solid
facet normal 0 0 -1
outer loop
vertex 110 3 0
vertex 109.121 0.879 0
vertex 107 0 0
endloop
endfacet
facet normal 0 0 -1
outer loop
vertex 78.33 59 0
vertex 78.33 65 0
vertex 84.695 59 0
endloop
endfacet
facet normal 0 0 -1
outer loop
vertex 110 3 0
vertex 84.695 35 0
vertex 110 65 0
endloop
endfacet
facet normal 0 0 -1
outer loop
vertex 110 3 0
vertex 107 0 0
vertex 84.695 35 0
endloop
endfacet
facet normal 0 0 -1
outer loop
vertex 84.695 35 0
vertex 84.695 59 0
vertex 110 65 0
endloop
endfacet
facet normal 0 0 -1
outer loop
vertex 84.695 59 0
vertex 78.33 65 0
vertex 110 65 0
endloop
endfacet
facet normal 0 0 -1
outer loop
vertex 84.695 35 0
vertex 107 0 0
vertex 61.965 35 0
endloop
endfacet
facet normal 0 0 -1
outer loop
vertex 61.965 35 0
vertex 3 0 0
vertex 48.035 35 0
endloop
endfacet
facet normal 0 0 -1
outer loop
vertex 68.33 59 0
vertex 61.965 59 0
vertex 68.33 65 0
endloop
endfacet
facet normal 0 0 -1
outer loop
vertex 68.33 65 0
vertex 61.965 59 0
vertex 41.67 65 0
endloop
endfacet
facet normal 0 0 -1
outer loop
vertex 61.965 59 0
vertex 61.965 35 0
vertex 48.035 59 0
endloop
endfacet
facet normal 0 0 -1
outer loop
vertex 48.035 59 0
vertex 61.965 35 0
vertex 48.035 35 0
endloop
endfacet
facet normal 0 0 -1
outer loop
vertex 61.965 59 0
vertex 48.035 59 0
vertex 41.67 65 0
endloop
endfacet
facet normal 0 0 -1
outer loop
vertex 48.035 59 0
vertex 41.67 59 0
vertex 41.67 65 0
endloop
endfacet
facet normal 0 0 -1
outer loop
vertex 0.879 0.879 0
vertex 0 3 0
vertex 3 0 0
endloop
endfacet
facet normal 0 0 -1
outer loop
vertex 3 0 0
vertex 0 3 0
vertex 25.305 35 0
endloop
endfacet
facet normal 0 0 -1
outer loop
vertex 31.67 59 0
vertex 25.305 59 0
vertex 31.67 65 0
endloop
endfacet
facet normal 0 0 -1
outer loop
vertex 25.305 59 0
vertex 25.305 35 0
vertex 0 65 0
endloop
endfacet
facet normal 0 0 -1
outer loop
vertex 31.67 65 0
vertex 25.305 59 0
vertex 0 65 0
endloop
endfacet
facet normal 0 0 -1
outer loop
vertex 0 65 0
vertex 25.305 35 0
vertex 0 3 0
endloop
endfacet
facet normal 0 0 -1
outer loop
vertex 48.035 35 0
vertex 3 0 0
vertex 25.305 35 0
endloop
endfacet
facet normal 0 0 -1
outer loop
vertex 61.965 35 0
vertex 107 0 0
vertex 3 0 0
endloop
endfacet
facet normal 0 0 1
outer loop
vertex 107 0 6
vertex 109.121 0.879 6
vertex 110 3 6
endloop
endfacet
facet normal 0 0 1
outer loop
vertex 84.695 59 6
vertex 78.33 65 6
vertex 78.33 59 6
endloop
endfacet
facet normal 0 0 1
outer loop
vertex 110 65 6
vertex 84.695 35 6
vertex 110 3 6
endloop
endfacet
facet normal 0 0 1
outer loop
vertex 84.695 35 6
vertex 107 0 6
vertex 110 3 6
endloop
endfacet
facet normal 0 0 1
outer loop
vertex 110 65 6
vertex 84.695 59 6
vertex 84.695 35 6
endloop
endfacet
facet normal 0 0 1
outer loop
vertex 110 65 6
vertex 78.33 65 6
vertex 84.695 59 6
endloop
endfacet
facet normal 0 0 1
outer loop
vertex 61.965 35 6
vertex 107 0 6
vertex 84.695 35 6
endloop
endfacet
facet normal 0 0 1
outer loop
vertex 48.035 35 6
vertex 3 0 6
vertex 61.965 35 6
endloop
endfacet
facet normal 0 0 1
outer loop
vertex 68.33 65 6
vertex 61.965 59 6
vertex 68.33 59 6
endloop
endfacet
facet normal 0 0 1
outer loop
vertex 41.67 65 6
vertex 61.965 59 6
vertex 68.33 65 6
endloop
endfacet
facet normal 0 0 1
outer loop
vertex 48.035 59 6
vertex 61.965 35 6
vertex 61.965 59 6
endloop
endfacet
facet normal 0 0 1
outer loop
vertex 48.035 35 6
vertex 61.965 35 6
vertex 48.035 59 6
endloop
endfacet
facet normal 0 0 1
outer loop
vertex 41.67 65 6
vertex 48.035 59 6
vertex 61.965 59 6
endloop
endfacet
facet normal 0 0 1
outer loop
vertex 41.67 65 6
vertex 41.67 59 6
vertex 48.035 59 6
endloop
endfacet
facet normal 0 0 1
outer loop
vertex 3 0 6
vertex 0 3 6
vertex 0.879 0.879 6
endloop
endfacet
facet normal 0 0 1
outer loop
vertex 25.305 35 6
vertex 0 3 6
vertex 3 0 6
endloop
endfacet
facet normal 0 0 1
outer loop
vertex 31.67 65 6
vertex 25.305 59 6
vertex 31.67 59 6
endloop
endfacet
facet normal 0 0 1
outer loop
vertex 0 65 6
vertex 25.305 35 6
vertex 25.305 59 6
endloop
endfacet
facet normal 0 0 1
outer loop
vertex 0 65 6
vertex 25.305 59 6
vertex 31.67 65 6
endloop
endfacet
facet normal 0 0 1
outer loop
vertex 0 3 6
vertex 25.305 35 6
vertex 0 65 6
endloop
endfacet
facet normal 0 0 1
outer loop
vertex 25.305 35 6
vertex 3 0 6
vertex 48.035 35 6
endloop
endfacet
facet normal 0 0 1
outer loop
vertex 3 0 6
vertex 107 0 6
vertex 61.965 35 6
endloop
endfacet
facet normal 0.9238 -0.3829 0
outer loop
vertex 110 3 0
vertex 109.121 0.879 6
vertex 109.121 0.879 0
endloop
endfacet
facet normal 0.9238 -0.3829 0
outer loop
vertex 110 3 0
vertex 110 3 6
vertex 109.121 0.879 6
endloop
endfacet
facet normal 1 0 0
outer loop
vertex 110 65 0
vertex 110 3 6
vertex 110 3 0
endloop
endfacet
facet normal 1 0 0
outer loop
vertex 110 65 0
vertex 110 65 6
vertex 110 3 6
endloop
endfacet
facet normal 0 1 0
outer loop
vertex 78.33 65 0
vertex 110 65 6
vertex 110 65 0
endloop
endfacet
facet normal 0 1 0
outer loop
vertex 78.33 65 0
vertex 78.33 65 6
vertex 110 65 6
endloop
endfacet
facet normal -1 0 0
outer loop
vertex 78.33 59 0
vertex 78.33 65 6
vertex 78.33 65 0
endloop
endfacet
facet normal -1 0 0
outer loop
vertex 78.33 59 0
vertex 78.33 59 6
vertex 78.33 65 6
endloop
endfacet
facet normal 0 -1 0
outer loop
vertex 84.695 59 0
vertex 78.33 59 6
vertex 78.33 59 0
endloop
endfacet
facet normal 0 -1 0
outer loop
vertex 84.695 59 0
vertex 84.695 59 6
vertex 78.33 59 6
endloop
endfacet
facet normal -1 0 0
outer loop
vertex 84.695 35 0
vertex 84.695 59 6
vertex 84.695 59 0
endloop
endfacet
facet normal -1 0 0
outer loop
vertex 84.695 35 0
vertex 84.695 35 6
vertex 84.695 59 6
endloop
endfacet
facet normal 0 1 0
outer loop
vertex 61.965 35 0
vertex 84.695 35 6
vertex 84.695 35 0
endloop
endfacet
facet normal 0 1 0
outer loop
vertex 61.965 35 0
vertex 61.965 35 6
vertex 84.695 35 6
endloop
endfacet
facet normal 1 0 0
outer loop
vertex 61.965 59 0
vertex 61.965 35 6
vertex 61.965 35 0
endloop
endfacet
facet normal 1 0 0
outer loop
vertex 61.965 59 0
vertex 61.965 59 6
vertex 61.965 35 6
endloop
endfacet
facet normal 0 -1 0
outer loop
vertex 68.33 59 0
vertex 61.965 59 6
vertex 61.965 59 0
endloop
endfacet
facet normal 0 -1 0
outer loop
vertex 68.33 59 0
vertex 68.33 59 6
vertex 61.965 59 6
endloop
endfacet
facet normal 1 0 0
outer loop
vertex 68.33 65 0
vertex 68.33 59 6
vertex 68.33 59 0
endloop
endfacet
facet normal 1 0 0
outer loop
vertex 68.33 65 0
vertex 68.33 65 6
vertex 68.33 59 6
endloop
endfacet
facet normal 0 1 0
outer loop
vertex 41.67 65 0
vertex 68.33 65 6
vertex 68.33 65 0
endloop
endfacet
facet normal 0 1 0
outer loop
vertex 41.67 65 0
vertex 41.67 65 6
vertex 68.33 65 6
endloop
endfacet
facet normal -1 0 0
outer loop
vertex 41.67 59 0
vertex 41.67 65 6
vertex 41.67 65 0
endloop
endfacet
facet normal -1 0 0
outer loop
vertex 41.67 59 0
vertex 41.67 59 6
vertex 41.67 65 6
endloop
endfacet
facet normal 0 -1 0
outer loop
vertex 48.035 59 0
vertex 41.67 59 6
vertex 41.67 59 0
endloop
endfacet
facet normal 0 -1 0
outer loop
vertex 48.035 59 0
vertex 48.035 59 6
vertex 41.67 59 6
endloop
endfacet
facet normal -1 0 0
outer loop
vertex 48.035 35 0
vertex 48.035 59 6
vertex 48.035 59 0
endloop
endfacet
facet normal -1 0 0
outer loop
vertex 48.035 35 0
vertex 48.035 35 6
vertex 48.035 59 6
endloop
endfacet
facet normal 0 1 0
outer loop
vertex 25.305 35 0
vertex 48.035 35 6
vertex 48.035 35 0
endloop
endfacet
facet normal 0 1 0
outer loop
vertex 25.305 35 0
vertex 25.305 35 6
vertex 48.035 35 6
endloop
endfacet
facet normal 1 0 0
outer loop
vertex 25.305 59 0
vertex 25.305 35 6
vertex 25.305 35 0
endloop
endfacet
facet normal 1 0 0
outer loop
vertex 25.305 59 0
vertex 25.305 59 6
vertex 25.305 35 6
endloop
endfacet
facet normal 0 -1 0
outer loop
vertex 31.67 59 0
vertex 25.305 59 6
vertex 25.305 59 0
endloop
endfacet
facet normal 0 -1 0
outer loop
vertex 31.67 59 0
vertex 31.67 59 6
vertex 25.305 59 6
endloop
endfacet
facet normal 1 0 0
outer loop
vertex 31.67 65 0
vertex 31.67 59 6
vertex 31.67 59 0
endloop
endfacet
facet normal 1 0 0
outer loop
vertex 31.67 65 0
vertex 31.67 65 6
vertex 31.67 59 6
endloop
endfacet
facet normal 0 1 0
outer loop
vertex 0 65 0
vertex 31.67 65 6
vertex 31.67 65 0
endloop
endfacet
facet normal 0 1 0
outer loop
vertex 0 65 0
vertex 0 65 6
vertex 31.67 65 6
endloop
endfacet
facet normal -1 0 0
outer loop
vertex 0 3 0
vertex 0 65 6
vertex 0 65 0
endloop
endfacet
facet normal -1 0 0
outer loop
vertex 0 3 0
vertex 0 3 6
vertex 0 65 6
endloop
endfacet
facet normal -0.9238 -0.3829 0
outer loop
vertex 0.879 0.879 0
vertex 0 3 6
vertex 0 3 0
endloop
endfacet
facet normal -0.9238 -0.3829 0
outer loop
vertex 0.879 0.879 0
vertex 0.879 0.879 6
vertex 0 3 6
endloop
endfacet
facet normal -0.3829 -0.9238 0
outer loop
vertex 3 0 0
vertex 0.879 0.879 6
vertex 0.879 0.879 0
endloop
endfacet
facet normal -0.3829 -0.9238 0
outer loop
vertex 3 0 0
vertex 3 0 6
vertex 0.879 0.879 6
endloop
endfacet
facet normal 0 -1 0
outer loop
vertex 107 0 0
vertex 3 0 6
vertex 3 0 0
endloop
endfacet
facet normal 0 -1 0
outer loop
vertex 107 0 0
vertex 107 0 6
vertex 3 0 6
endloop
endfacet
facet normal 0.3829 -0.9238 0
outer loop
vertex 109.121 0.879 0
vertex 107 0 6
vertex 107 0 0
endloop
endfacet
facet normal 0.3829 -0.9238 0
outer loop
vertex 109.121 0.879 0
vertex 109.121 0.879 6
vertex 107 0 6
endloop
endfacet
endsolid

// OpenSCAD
$fn = 32;

// ----------------------------------------------------------------------
// Window plate: 110 x 65 mm, 2 open windows
// ----------------------------------------------------------------------

// --- parameters (mm) ---
profile_height = 6;       // extrusion height
profile_points = 24;      // points of the closed outline

profile = [[0, 3], [0.879, 0.879], [3, 0], [107, 0], [109.121, 0.879], [110, 3], [110, 65], [78.33, 65], [78.33, 59], [84.695, 59], [84.695, 35], [61.965, 35], [61.965, 59], [68.33, 59], [68.33, 65], [41.67, 65], [41.67, 59], [48.035, 59], [48.035, 35], [25.305, 35], [25.305, 59], [31.67, 59], [31.67, 65], [0, 65]];  // single closed polygon, 24 points, counter clockwise

// --- the one profile operation ---
linear_extrude(height = profile_height) polygon(points = profile);
